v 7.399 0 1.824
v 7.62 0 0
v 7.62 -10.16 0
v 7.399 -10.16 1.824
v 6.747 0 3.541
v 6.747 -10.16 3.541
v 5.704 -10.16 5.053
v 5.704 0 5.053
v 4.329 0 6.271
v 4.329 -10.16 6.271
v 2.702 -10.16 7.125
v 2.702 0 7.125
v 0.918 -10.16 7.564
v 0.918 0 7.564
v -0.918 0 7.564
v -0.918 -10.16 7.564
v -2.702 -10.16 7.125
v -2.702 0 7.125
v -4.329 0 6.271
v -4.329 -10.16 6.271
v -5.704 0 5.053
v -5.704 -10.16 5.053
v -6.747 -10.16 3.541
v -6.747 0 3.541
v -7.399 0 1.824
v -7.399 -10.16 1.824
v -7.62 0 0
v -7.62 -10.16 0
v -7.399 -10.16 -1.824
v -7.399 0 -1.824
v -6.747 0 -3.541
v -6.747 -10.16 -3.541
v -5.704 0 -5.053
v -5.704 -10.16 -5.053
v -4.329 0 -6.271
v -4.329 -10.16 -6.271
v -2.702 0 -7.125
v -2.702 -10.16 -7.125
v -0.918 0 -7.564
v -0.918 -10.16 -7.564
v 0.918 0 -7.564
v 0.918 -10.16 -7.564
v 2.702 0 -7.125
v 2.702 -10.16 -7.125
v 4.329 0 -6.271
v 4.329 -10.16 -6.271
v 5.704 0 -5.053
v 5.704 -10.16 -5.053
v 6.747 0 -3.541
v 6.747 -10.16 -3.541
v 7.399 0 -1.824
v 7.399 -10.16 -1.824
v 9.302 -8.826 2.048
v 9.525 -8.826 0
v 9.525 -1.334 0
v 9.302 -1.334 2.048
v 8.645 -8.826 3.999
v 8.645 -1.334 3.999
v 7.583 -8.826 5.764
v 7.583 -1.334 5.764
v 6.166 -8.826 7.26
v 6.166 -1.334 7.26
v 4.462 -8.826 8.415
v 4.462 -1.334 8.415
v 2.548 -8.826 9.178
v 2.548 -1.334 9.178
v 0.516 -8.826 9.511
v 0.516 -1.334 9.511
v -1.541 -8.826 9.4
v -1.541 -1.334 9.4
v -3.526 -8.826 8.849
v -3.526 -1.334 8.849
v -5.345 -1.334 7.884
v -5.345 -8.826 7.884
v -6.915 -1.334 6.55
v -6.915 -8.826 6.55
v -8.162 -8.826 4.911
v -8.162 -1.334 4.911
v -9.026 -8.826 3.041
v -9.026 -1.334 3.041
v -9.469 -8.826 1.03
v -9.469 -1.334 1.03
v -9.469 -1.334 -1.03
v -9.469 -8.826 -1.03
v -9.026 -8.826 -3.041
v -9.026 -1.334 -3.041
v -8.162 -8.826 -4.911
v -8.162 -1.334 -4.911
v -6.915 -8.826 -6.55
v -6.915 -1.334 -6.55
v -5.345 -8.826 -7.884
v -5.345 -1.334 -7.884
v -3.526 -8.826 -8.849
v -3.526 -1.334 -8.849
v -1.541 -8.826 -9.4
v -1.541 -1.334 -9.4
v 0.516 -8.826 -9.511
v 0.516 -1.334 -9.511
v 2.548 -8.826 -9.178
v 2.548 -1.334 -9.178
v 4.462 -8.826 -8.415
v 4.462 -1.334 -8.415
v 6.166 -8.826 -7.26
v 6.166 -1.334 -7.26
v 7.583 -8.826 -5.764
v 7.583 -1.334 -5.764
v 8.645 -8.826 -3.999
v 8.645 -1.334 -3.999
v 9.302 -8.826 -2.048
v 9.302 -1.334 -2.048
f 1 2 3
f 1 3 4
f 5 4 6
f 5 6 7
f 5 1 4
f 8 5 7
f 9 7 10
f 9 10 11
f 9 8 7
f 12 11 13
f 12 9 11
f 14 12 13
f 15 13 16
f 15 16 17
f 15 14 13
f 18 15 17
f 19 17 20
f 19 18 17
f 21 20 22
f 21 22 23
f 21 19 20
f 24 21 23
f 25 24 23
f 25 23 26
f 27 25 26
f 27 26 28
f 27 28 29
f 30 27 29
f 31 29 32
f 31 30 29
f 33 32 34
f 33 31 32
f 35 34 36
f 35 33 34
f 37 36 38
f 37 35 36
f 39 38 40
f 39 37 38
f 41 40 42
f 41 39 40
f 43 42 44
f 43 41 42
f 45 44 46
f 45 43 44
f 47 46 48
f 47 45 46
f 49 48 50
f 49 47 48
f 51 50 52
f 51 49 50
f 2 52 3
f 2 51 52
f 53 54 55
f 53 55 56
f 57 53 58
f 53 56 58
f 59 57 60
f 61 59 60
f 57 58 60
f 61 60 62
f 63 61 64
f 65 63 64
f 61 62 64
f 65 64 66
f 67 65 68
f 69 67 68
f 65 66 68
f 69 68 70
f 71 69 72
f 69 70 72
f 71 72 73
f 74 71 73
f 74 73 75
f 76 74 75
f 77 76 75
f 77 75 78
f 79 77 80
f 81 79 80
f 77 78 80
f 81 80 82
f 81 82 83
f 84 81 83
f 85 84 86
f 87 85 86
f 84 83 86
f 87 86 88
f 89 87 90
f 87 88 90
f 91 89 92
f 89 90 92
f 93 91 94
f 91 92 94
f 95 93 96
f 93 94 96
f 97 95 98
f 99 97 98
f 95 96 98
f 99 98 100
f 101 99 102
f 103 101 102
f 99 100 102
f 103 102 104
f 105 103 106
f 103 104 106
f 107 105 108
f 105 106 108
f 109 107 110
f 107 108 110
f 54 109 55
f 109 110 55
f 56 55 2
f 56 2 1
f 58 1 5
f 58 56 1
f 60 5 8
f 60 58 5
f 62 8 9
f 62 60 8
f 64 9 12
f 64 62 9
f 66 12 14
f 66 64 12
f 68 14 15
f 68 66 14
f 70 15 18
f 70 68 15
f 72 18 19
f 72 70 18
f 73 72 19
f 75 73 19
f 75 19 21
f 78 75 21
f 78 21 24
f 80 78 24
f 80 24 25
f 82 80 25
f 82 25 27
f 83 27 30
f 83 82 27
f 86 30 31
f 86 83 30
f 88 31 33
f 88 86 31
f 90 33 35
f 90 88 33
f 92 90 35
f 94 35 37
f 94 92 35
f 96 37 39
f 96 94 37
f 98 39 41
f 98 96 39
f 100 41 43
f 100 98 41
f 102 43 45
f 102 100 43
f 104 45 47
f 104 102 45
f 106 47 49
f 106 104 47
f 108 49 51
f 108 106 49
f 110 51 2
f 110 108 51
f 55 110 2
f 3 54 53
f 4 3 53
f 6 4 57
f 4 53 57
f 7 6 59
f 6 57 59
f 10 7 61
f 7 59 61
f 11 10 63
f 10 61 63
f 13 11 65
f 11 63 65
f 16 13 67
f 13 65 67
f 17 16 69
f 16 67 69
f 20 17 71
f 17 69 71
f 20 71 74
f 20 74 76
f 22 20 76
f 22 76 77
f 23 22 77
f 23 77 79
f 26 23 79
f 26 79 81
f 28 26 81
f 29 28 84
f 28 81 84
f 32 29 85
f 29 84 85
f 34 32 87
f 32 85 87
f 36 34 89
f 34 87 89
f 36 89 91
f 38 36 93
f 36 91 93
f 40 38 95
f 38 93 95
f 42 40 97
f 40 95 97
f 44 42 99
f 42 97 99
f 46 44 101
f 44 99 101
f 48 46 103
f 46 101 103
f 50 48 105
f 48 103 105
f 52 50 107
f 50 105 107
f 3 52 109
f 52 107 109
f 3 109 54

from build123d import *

# Parameters (mm, degrees)
F0_R       = 9.525
F0_R_2     = 7.62
F1_DEPTH   = 10.16
F2_SIZE2   = 1.333885
F2_SIZE    = 1.90499
F2_2_SIZE2 = 1.333885
F2_2_SIZE  = 1.90499


# Not quite as in the source:
# - a fillet or chamfer is up to 0.001 mm smaller than in the source, because OpenCascade refuses the exact size


with BuildPart() as f1:
    # F0 (on Front) → F1 (new body)
    with BuildSketch(Plane.XZ):
        Circle(F0_R)
        Circle(F0_R_2, mode=Mode.SUBTRACT)
    extrude(amount=F1_DEPTH)

    # F2 (size 1.905 and 1.3338953603 in the source; OpenCascade refuses exactly that, so slightly less here)
    f2_edges = [f1.edges().sort_by_distance(p)[0] for p in [
        (-9.525, -10.16, 0),
    ]]
    f2_side = f1.faces().sort_by_distance((-9.255592, -10.16, 0))[0]
    chamfer(f2_edges, length=F2_SIZE, length2=F2_SIZE2, reference=f2_side)

    # F2#2 (size 1.905 and 1.3338953603 in the source; OpenCascade refuses exactly that, so slightly less here)
    f2_2_edges = [f1.edges().sort_by_distance(p)[0] for p in [
        (-9.525, 0, 0),
    ]]
    f2_2_side = f1.faces().sort_by_distance((-9.255592, 0, 0))[0]
    chamfer(f2_2_edges, length=F2_2_SIZE, length2=F2_2_SIZE2, reference=f2_2_side)


solid = f1.part
